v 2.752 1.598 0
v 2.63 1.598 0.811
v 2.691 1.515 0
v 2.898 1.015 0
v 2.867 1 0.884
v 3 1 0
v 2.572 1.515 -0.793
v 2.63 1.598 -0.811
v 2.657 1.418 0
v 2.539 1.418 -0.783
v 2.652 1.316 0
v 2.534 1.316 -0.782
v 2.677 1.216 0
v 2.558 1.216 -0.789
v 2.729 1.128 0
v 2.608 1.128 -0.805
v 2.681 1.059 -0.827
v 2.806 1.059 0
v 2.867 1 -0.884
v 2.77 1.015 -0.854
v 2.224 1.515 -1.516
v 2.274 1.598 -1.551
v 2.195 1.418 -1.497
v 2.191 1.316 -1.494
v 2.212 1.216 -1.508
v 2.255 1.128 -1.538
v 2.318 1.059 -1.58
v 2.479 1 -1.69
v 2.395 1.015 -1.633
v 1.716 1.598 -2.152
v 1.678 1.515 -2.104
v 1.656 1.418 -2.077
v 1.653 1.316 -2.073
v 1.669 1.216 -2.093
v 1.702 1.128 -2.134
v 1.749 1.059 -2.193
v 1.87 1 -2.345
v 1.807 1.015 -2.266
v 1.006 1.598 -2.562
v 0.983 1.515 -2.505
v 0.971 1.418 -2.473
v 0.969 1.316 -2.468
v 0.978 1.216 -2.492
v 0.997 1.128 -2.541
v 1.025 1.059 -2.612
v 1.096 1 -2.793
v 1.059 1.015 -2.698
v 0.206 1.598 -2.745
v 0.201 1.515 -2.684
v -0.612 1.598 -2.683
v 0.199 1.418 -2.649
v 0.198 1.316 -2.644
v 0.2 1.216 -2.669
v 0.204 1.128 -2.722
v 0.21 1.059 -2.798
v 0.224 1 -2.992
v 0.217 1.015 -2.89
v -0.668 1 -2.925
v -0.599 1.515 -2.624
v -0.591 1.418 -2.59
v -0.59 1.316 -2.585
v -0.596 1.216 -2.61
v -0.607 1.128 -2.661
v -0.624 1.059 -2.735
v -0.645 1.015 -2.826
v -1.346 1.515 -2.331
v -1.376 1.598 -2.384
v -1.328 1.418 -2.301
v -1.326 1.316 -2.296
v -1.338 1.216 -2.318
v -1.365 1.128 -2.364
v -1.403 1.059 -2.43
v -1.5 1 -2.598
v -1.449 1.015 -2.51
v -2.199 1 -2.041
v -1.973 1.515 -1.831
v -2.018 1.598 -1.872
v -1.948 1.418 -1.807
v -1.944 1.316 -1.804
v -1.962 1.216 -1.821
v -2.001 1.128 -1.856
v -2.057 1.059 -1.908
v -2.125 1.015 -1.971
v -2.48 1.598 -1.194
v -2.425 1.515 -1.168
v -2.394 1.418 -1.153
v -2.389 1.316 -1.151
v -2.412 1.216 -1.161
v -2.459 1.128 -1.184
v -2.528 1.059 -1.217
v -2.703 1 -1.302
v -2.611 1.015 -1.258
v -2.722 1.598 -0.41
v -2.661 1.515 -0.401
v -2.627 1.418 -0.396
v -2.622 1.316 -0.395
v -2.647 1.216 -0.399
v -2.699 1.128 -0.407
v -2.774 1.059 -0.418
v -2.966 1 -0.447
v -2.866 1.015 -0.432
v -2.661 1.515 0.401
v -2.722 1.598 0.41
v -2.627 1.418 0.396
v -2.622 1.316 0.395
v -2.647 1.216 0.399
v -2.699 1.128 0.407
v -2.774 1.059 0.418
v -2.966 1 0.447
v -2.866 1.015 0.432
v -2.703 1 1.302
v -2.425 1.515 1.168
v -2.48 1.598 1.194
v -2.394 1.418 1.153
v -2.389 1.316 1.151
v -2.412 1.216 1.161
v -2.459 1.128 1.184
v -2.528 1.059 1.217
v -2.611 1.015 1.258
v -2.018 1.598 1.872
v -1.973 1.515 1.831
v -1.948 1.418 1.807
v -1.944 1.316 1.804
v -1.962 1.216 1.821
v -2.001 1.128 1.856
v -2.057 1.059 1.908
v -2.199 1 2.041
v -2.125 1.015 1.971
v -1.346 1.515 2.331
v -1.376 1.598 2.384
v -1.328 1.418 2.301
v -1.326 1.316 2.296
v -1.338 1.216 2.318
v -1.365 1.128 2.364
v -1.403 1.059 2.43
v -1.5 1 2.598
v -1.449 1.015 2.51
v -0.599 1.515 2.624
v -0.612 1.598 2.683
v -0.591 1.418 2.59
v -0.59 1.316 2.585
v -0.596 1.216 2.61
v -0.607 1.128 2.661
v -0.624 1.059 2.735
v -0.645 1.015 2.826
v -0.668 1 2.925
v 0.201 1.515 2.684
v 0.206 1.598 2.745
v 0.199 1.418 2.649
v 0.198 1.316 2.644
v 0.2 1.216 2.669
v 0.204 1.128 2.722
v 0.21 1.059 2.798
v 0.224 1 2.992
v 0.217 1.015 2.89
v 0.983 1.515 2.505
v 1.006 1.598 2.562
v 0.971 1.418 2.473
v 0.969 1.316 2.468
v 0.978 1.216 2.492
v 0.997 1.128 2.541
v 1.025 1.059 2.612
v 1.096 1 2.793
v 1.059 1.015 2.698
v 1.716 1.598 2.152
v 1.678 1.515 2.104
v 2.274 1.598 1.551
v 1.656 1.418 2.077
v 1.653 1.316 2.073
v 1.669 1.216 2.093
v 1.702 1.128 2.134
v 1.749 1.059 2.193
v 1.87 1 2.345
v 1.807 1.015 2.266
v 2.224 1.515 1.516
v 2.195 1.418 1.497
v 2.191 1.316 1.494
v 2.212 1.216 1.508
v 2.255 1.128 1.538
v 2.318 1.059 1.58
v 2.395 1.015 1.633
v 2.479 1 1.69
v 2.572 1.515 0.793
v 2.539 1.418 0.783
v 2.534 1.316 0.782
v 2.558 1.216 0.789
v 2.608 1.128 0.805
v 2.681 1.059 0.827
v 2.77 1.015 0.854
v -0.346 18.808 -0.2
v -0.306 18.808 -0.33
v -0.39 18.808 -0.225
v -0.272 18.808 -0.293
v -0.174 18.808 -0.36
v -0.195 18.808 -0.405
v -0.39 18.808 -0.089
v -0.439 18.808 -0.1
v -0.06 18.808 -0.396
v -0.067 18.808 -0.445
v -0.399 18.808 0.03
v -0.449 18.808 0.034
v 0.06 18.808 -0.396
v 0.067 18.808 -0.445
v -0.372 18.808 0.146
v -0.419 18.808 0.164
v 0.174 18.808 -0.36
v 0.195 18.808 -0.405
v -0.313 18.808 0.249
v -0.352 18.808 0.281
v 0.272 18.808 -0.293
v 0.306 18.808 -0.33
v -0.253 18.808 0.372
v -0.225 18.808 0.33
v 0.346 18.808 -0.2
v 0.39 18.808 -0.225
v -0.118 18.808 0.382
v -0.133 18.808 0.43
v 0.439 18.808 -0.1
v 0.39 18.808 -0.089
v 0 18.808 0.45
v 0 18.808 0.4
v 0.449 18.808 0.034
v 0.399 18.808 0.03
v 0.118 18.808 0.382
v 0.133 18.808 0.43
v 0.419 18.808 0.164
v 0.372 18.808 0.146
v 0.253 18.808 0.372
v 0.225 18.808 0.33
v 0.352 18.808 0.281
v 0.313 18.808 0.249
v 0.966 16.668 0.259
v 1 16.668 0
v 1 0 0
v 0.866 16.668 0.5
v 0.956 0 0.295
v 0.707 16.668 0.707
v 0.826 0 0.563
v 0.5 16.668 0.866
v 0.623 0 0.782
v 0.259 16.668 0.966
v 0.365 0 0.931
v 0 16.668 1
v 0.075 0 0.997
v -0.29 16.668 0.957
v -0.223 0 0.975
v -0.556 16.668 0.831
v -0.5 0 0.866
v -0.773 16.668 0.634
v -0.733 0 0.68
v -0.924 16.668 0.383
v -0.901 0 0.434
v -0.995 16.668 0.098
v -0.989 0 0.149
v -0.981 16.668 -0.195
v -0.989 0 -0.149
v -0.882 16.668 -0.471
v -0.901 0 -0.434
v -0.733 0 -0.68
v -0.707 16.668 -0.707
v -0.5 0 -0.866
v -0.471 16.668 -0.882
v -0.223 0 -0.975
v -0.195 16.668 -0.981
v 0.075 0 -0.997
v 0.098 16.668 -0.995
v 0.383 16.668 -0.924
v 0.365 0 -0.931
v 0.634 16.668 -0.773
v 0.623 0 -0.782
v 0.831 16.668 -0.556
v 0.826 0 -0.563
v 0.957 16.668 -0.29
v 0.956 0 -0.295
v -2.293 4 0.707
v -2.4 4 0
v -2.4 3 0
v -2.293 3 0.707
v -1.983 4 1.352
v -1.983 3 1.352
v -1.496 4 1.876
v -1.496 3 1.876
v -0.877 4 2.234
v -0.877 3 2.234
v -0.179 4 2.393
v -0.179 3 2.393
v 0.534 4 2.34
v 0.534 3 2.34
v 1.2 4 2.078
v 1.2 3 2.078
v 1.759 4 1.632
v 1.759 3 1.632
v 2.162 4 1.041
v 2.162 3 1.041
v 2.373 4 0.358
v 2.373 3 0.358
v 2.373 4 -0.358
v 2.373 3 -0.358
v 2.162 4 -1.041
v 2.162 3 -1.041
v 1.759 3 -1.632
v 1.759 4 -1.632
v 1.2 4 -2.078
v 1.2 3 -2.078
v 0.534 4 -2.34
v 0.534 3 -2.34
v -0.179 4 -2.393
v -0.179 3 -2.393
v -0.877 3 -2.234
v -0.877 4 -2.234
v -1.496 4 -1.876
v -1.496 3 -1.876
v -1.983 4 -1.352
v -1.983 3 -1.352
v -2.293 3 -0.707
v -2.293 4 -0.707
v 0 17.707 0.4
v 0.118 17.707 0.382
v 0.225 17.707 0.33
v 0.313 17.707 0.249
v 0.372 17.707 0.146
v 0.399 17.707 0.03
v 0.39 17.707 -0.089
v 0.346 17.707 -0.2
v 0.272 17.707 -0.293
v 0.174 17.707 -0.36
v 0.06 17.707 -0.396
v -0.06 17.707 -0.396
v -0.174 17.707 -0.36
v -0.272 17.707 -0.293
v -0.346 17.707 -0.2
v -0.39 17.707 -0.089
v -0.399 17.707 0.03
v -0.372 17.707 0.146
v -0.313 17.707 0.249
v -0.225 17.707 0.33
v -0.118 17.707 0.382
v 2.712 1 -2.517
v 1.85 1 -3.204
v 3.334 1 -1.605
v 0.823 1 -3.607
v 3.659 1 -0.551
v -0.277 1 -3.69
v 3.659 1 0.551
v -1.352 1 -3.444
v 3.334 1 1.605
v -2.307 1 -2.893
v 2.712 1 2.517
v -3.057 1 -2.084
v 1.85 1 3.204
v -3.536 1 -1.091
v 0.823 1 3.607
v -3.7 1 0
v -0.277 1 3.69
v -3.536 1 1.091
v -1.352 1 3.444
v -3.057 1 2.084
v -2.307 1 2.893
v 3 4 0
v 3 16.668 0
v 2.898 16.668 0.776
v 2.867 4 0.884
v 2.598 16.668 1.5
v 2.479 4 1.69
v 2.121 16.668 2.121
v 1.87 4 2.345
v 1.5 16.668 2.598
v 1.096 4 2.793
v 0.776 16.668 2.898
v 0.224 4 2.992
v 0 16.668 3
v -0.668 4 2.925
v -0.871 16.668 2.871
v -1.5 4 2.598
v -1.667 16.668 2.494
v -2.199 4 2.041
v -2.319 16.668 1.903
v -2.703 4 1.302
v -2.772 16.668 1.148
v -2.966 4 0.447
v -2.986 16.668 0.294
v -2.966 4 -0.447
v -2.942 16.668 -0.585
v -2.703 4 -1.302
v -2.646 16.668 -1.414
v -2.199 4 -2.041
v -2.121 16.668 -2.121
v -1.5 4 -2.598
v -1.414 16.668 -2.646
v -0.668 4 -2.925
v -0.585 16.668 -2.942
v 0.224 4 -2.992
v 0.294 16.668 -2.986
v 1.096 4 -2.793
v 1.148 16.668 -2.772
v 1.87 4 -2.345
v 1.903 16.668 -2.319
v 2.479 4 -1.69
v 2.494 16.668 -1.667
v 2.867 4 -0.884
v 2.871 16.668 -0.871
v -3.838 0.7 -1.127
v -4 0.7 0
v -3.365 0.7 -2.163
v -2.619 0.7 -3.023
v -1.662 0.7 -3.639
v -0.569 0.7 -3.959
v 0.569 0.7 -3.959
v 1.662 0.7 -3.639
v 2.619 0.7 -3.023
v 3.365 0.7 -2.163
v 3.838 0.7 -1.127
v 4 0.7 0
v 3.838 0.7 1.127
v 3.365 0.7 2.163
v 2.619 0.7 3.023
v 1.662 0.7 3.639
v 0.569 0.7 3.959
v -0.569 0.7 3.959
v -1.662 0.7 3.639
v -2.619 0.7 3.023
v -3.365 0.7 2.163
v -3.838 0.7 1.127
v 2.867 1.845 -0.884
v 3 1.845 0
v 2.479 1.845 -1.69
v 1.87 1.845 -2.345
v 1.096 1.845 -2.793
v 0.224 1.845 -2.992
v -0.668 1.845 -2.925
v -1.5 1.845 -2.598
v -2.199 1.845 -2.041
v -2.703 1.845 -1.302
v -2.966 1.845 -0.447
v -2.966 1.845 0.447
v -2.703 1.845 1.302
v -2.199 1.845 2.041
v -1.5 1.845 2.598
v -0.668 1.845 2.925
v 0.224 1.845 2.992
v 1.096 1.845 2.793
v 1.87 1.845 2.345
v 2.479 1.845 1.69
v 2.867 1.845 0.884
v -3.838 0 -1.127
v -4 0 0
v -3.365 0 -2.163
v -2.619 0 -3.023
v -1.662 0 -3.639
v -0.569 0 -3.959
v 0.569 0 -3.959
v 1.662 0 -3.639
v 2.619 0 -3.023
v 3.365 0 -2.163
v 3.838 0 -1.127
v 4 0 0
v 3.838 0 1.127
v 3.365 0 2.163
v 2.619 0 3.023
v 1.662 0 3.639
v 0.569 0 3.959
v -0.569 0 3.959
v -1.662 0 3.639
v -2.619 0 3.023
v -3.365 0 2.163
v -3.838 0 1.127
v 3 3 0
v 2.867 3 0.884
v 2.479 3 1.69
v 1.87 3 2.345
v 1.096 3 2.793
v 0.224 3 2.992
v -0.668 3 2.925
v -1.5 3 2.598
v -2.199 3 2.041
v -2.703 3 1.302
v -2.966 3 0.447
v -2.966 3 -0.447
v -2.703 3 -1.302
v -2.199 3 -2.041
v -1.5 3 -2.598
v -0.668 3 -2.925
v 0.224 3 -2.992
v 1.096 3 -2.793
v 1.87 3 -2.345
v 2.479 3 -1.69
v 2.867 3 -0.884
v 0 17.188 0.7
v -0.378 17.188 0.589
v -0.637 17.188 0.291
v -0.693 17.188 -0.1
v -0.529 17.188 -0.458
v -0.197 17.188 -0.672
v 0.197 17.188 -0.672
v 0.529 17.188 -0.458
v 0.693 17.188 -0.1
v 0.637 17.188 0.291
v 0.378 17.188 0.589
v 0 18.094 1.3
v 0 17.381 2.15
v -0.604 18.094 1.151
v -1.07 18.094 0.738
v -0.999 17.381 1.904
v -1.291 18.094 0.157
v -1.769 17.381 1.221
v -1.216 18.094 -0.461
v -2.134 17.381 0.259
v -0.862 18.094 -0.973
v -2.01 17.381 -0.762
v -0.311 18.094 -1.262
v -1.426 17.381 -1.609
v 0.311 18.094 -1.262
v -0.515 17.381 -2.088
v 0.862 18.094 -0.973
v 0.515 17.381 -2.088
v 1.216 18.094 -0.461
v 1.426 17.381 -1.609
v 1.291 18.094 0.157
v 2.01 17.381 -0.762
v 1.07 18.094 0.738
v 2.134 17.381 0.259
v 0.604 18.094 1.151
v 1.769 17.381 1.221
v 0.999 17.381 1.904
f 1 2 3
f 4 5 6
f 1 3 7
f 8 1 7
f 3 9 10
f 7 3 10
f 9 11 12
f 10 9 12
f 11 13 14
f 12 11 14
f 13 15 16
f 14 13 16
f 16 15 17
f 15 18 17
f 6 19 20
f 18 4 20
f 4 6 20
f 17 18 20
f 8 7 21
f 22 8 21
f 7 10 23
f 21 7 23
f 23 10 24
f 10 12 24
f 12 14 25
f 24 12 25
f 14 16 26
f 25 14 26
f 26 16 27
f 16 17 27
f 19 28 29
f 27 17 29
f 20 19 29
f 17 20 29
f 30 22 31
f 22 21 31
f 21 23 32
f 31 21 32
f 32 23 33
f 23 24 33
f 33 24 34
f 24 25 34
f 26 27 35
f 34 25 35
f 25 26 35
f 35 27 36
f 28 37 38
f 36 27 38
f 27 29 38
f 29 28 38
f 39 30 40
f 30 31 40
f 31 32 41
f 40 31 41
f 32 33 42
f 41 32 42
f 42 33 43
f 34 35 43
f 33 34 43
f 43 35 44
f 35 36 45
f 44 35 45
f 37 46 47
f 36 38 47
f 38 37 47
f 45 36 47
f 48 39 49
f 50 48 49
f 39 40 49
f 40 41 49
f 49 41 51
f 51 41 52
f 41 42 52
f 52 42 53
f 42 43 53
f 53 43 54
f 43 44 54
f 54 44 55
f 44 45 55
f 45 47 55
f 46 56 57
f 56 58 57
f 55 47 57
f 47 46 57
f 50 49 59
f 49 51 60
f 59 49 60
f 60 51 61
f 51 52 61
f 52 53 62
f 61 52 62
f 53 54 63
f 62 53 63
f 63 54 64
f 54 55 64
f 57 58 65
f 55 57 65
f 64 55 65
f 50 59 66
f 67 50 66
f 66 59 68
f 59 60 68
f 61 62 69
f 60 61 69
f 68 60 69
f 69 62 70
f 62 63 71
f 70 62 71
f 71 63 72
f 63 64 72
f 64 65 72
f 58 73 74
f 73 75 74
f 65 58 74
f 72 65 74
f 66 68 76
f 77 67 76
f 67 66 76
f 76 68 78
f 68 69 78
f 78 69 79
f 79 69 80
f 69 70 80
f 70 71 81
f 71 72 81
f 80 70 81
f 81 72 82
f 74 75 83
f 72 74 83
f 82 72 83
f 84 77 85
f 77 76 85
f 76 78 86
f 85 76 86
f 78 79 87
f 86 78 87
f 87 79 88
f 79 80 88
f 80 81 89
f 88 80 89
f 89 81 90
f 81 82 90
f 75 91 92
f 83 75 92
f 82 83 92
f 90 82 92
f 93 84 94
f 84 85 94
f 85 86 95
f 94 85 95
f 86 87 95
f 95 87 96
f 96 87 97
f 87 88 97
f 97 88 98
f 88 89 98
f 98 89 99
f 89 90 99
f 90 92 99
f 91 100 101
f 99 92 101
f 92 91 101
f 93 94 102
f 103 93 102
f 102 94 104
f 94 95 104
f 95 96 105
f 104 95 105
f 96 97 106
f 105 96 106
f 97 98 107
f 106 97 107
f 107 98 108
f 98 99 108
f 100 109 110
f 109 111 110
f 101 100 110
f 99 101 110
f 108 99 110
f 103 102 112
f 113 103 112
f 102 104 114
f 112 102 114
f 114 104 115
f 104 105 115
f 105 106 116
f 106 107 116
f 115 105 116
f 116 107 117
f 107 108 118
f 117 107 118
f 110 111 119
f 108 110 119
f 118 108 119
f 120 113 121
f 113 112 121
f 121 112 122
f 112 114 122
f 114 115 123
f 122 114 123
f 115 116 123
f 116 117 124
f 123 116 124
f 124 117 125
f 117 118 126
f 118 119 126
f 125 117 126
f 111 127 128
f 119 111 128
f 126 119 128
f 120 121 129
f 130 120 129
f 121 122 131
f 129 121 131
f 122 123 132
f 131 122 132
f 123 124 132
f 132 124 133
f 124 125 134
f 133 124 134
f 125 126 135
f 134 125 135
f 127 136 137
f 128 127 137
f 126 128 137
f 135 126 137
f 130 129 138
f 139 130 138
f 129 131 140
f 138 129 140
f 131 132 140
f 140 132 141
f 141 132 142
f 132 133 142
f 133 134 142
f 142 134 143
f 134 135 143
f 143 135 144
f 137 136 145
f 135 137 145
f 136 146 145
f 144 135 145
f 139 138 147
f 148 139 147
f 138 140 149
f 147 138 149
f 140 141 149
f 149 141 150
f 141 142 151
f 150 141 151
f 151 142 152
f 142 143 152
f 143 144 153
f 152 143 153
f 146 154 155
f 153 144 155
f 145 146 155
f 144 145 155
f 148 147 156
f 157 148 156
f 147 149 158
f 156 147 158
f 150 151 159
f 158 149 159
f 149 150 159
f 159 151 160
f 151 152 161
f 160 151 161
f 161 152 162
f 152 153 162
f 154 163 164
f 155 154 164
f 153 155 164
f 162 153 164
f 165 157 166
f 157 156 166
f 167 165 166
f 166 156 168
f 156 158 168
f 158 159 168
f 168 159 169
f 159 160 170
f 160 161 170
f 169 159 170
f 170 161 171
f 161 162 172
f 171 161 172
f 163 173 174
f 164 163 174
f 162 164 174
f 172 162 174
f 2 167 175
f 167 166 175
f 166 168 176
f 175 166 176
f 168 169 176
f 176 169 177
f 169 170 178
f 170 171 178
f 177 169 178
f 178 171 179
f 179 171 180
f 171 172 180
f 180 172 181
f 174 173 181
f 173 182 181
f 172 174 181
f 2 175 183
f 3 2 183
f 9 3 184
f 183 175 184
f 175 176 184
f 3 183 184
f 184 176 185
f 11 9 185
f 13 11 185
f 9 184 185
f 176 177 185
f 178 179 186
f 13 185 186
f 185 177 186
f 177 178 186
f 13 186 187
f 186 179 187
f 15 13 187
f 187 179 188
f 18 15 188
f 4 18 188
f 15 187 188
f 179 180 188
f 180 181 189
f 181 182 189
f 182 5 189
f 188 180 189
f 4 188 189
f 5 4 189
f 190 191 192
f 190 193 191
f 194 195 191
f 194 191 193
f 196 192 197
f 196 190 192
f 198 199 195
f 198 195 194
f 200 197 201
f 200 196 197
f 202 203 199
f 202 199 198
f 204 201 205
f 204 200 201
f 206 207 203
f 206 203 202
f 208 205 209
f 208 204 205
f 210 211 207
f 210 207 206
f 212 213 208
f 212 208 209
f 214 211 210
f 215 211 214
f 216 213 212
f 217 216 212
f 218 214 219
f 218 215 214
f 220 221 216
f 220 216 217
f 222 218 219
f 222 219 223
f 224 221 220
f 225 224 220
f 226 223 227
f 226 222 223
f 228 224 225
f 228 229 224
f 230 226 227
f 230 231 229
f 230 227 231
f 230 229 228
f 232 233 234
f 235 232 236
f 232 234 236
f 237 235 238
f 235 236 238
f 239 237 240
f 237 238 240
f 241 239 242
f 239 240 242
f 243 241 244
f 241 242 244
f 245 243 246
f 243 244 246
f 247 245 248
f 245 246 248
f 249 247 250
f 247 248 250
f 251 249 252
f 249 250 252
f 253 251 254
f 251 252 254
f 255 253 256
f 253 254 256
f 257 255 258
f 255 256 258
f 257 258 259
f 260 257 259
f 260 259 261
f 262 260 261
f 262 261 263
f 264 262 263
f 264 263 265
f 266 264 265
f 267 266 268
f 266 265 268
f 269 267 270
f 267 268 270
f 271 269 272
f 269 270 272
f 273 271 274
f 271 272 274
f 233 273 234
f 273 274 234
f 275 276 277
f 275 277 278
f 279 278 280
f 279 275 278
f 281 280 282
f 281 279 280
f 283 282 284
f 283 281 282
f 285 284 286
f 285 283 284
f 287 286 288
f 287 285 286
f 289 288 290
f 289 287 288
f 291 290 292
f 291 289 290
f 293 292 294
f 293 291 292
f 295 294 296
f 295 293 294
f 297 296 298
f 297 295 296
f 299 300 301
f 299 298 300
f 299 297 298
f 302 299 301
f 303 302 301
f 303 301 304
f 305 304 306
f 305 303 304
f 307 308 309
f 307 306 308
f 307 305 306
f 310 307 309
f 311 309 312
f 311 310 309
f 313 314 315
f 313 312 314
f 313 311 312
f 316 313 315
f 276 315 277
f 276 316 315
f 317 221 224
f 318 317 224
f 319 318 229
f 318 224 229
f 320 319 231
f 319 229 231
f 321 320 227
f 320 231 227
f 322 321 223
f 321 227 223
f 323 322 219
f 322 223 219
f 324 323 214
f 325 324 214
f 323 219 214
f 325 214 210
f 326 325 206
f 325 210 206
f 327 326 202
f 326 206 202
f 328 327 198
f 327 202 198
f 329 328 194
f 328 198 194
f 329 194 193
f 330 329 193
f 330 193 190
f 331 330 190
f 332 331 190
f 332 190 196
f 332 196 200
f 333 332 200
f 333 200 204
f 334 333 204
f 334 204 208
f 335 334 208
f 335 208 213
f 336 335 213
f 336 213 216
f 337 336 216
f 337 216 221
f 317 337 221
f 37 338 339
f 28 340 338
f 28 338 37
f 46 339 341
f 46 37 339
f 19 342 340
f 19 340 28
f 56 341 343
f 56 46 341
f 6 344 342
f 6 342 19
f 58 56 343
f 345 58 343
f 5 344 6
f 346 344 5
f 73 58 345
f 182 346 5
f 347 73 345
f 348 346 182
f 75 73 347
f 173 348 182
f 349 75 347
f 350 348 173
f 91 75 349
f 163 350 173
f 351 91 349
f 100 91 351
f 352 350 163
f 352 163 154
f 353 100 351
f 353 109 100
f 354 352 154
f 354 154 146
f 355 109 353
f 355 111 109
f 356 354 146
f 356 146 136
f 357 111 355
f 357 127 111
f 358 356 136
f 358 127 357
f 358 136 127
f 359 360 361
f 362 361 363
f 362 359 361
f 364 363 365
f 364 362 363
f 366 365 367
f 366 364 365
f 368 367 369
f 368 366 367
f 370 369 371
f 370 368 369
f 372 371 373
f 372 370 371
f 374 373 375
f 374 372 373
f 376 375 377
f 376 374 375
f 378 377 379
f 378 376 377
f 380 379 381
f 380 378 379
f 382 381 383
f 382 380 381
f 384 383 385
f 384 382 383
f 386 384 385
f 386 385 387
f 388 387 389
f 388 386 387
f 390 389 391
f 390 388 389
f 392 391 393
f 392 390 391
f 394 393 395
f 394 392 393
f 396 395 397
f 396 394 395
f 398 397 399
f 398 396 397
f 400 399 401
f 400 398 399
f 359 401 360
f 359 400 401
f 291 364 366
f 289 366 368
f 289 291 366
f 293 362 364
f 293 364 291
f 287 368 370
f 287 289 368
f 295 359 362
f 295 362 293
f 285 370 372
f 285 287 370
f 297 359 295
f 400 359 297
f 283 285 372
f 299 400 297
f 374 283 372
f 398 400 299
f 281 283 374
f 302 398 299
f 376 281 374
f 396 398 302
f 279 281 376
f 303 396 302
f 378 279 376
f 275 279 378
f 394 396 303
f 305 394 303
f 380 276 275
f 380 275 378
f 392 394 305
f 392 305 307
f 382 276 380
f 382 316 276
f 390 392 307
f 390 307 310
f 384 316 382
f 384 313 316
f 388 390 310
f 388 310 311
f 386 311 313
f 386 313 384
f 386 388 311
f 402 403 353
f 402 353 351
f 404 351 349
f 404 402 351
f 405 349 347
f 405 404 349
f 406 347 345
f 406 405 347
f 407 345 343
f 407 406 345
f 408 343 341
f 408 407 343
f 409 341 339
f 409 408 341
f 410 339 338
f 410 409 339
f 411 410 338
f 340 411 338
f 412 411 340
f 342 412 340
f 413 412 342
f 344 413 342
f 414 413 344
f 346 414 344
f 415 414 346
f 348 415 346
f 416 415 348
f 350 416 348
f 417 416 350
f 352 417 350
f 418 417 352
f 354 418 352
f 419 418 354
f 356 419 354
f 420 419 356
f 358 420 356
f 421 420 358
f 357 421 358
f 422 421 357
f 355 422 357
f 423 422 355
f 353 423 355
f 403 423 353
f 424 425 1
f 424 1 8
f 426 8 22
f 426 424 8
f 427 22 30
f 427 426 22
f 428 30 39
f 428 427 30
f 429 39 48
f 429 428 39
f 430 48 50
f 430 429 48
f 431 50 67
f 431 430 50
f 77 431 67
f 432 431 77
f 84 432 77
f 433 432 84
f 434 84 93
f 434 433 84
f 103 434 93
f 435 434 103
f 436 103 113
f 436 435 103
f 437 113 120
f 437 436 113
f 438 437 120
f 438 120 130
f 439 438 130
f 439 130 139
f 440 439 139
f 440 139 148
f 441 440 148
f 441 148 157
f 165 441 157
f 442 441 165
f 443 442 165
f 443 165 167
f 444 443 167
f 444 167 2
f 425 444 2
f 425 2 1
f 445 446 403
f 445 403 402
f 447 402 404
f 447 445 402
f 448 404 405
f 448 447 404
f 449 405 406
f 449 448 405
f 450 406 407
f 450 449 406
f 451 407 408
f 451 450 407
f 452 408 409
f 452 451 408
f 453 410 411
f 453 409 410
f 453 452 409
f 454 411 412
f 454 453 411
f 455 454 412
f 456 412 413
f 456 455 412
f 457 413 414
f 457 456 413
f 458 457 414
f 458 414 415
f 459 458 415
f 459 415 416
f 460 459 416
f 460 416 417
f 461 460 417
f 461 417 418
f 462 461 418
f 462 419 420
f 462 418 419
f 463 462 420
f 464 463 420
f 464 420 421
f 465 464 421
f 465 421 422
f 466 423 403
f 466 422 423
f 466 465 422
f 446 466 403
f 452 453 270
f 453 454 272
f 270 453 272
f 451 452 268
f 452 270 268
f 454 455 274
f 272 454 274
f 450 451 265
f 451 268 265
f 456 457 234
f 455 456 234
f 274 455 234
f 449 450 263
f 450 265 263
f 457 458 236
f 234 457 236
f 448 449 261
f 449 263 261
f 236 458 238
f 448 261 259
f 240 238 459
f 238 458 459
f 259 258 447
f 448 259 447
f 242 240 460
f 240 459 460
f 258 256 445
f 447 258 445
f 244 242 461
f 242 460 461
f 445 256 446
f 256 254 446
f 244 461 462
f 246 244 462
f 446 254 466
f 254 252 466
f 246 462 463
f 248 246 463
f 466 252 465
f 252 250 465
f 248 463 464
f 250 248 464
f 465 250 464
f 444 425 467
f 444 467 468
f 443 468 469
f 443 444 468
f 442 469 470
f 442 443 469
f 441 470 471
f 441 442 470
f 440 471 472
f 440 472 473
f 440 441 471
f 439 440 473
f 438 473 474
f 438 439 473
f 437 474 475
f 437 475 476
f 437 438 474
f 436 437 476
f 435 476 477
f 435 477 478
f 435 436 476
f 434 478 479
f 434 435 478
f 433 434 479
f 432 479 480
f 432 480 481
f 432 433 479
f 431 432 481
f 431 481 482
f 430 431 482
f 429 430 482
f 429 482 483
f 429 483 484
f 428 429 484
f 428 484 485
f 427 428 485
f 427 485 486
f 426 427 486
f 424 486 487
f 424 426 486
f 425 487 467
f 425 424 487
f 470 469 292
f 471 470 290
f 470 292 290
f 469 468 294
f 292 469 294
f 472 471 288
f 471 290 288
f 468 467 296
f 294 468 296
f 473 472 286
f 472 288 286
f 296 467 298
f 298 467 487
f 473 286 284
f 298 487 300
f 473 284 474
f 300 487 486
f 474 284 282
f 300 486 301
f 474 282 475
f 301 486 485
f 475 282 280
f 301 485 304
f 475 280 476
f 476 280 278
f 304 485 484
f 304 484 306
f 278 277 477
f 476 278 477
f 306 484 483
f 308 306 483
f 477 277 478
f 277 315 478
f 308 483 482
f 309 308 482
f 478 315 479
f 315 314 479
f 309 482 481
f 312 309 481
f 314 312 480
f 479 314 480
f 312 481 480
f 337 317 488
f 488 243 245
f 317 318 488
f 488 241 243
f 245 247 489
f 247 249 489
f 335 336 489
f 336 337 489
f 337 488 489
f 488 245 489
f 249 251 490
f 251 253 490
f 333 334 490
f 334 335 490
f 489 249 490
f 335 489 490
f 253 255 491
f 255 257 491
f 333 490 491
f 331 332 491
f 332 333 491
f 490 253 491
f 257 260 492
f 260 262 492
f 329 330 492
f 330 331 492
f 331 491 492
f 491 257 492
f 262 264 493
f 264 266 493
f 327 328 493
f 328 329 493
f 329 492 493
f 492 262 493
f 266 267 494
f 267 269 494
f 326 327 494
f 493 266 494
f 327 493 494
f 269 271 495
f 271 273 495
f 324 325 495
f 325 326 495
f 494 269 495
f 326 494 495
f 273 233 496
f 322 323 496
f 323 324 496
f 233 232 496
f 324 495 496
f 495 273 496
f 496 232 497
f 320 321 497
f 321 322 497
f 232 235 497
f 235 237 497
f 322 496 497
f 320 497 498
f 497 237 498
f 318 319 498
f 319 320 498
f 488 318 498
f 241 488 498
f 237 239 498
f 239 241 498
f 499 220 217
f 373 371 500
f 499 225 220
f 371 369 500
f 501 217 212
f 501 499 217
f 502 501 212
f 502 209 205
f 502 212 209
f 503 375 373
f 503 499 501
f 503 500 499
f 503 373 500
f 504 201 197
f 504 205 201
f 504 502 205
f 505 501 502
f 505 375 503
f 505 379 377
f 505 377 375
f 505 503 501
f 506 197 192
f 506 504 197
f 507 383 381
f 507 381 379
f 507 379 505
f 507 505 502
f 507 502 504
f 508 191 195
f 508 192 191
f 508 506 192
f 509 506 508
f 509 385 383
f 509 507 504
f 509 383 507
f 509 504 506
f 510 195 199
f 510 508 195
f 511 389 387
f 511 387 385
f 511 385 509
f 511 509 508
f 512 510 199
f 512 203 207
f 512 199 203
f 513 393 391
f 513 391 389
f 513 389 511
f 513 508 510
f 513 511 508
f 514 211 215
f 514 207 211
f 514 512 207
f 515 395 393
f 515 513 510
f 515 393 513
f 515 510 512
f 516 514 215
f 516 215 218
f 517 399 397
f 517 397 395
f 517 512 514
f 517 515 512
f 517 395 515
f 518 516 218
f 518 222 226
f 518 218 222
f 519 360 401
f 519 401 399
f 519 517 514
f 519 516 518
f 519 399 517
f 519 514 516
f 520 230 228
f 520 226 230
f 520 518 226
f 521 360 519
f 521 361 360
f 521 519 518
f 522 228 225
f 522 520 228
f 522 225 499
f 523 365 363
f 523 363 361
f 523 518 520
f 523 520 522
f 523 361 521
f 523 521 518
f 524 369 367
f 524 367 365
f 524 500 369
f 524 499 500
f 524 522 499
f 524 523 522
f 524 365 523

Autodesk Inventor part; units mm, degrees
ref_plane "XZ Plane" through (0, 0, 0) normal (0, 1, 0) x (-1, 0, 0)
sketch "Sketch1" plane through (0, 0, 0) normal (0, 1, 0) x (-1, 0, 0)
  circle A0 centre (0, 0) radius 4
  dimension "d0" = 8
extrude "Extrusion1" add sketch "Sketch1" along normal blind 1
sketch "Sketch2" plane through (0, 1, 0) normal (0, 1, 0) x (1, 0, 0)
  circle A0 centre (0, 0) radius 4 projected
  circle A1 centre (0, 0) radius 3
  dimension "d3" = 6
extrude "Extrusion2" add sketch "Sketch2" along normal blind 15.668 contours A1
sketch "Sketch3" plane through (0, 0, 0) normal (0, -1, 0) x (1, 0, 0)
  circle A0 centre (0, 0) radius 4 projected
  circle A1 centre (0, 0) radius 1
  dimension "d6" = 2
extrude "Extrusion3" cut sketch "Sketch3" against normal blind 21 contours A1
sketch "Sketch4" plane through (0, 0, 0) normal (1, 0, 0) x (0, 1, 0)
  line L0 (1, 3) -> (16.668, 3) projected
  line L1 (1, -3) -> (16.668, -3) projected
  line L2 (0, 0) -> (17, 0)
  line L3 (16.668, 3) -> (18.9755, 0.25)
  line L4 (16.668, -3) -> (16.668, 3) projected
  line L5 (16.668, 0.2) -> (18.9755, 0.2)
  line L6 (17.7072, 0.4) -> (16.668, 1)
  line L7 (0, 1) -> (16.668, 1) projected
  line L8 (16.668, 1) -> (16.668, 3)
  line L9 (18.9755, 0.25) -> (18.9755, 0.2)
  line L10 (17.7072, 0.4) -> (18.8077, 0.4)
  line L11 (18.8077, 0.4) -> (18.8077, 0.45)
  point P0 (17.8856, 0.2)
  dimension "d9" = 40
  dimension "d10" = 0.2
  dimension "d11" = 30
  dimension "d20" = 0.05
  dimension "d21" = 0.4
  dimension "d22" = 0.05
revolve "Revolution1" add sketch "Sketch4" angle 360 about axis through (0, 0, 0) along (0, 1, 0) contours L3 L11 L10 L6 L4
sketch "Sketch5" plane through (0, 0, 0) normal (0, 0, 1) x (1, 0, 0)
  circle A0 centre (3, 1.35) radius 0.35
  line L0 (4, 1) -> (-4, 1) projected
  line L1 (3, 3) -> (3, 0)
  line L2 (0, 1.1204) -> (0, 3)
  line L3 (2.7525, 1.5975) -> (3.3734, 2.2184)
  line L4 (3.3734, 2.2184) -> (3.3499, 1.3406)
  point P0 (0, 0)
  dimension "d14" = 0.7
  dimension "d19" = 45
revolve "Revolution2" cut sketch "Sketch5" angle 360 about axis through (0, 1.1204, 0) along (0, 1, 0)
chamfer "Chamfer1" distance 0.3 angle 45 1 edges at (4, 1, 0)
sketch "Sketch6" plane through (0, 0, 0) normal (0, 0, 1) x (1, 0, 0)
  line L0 (-3, 1.845) -> (-3, 16.668) projected
  line L1 (-3, 3) -> (-2.4, 3)
  line L2 (-2.4, 3) -> (-2.4, 4)
  line L3 (-2.4, 4) -> (-3, 4)
  line L4 (-3, 4) -> (-3, 3)
  line L5 (-4, 0) -> (4, 0) projected
  line L6 (0, 0) -> (0, -2.0894)
  dimension "d23" = 0.6
  dimension "d24" = 1
  dimension "d25" = 3
revolve "Revolution3" cut sketch "Sketch6" angle 360 about axis through (0, 0, 0) along (0, -1, 0)
properties part number "nozzle0.8" material "Copper"
